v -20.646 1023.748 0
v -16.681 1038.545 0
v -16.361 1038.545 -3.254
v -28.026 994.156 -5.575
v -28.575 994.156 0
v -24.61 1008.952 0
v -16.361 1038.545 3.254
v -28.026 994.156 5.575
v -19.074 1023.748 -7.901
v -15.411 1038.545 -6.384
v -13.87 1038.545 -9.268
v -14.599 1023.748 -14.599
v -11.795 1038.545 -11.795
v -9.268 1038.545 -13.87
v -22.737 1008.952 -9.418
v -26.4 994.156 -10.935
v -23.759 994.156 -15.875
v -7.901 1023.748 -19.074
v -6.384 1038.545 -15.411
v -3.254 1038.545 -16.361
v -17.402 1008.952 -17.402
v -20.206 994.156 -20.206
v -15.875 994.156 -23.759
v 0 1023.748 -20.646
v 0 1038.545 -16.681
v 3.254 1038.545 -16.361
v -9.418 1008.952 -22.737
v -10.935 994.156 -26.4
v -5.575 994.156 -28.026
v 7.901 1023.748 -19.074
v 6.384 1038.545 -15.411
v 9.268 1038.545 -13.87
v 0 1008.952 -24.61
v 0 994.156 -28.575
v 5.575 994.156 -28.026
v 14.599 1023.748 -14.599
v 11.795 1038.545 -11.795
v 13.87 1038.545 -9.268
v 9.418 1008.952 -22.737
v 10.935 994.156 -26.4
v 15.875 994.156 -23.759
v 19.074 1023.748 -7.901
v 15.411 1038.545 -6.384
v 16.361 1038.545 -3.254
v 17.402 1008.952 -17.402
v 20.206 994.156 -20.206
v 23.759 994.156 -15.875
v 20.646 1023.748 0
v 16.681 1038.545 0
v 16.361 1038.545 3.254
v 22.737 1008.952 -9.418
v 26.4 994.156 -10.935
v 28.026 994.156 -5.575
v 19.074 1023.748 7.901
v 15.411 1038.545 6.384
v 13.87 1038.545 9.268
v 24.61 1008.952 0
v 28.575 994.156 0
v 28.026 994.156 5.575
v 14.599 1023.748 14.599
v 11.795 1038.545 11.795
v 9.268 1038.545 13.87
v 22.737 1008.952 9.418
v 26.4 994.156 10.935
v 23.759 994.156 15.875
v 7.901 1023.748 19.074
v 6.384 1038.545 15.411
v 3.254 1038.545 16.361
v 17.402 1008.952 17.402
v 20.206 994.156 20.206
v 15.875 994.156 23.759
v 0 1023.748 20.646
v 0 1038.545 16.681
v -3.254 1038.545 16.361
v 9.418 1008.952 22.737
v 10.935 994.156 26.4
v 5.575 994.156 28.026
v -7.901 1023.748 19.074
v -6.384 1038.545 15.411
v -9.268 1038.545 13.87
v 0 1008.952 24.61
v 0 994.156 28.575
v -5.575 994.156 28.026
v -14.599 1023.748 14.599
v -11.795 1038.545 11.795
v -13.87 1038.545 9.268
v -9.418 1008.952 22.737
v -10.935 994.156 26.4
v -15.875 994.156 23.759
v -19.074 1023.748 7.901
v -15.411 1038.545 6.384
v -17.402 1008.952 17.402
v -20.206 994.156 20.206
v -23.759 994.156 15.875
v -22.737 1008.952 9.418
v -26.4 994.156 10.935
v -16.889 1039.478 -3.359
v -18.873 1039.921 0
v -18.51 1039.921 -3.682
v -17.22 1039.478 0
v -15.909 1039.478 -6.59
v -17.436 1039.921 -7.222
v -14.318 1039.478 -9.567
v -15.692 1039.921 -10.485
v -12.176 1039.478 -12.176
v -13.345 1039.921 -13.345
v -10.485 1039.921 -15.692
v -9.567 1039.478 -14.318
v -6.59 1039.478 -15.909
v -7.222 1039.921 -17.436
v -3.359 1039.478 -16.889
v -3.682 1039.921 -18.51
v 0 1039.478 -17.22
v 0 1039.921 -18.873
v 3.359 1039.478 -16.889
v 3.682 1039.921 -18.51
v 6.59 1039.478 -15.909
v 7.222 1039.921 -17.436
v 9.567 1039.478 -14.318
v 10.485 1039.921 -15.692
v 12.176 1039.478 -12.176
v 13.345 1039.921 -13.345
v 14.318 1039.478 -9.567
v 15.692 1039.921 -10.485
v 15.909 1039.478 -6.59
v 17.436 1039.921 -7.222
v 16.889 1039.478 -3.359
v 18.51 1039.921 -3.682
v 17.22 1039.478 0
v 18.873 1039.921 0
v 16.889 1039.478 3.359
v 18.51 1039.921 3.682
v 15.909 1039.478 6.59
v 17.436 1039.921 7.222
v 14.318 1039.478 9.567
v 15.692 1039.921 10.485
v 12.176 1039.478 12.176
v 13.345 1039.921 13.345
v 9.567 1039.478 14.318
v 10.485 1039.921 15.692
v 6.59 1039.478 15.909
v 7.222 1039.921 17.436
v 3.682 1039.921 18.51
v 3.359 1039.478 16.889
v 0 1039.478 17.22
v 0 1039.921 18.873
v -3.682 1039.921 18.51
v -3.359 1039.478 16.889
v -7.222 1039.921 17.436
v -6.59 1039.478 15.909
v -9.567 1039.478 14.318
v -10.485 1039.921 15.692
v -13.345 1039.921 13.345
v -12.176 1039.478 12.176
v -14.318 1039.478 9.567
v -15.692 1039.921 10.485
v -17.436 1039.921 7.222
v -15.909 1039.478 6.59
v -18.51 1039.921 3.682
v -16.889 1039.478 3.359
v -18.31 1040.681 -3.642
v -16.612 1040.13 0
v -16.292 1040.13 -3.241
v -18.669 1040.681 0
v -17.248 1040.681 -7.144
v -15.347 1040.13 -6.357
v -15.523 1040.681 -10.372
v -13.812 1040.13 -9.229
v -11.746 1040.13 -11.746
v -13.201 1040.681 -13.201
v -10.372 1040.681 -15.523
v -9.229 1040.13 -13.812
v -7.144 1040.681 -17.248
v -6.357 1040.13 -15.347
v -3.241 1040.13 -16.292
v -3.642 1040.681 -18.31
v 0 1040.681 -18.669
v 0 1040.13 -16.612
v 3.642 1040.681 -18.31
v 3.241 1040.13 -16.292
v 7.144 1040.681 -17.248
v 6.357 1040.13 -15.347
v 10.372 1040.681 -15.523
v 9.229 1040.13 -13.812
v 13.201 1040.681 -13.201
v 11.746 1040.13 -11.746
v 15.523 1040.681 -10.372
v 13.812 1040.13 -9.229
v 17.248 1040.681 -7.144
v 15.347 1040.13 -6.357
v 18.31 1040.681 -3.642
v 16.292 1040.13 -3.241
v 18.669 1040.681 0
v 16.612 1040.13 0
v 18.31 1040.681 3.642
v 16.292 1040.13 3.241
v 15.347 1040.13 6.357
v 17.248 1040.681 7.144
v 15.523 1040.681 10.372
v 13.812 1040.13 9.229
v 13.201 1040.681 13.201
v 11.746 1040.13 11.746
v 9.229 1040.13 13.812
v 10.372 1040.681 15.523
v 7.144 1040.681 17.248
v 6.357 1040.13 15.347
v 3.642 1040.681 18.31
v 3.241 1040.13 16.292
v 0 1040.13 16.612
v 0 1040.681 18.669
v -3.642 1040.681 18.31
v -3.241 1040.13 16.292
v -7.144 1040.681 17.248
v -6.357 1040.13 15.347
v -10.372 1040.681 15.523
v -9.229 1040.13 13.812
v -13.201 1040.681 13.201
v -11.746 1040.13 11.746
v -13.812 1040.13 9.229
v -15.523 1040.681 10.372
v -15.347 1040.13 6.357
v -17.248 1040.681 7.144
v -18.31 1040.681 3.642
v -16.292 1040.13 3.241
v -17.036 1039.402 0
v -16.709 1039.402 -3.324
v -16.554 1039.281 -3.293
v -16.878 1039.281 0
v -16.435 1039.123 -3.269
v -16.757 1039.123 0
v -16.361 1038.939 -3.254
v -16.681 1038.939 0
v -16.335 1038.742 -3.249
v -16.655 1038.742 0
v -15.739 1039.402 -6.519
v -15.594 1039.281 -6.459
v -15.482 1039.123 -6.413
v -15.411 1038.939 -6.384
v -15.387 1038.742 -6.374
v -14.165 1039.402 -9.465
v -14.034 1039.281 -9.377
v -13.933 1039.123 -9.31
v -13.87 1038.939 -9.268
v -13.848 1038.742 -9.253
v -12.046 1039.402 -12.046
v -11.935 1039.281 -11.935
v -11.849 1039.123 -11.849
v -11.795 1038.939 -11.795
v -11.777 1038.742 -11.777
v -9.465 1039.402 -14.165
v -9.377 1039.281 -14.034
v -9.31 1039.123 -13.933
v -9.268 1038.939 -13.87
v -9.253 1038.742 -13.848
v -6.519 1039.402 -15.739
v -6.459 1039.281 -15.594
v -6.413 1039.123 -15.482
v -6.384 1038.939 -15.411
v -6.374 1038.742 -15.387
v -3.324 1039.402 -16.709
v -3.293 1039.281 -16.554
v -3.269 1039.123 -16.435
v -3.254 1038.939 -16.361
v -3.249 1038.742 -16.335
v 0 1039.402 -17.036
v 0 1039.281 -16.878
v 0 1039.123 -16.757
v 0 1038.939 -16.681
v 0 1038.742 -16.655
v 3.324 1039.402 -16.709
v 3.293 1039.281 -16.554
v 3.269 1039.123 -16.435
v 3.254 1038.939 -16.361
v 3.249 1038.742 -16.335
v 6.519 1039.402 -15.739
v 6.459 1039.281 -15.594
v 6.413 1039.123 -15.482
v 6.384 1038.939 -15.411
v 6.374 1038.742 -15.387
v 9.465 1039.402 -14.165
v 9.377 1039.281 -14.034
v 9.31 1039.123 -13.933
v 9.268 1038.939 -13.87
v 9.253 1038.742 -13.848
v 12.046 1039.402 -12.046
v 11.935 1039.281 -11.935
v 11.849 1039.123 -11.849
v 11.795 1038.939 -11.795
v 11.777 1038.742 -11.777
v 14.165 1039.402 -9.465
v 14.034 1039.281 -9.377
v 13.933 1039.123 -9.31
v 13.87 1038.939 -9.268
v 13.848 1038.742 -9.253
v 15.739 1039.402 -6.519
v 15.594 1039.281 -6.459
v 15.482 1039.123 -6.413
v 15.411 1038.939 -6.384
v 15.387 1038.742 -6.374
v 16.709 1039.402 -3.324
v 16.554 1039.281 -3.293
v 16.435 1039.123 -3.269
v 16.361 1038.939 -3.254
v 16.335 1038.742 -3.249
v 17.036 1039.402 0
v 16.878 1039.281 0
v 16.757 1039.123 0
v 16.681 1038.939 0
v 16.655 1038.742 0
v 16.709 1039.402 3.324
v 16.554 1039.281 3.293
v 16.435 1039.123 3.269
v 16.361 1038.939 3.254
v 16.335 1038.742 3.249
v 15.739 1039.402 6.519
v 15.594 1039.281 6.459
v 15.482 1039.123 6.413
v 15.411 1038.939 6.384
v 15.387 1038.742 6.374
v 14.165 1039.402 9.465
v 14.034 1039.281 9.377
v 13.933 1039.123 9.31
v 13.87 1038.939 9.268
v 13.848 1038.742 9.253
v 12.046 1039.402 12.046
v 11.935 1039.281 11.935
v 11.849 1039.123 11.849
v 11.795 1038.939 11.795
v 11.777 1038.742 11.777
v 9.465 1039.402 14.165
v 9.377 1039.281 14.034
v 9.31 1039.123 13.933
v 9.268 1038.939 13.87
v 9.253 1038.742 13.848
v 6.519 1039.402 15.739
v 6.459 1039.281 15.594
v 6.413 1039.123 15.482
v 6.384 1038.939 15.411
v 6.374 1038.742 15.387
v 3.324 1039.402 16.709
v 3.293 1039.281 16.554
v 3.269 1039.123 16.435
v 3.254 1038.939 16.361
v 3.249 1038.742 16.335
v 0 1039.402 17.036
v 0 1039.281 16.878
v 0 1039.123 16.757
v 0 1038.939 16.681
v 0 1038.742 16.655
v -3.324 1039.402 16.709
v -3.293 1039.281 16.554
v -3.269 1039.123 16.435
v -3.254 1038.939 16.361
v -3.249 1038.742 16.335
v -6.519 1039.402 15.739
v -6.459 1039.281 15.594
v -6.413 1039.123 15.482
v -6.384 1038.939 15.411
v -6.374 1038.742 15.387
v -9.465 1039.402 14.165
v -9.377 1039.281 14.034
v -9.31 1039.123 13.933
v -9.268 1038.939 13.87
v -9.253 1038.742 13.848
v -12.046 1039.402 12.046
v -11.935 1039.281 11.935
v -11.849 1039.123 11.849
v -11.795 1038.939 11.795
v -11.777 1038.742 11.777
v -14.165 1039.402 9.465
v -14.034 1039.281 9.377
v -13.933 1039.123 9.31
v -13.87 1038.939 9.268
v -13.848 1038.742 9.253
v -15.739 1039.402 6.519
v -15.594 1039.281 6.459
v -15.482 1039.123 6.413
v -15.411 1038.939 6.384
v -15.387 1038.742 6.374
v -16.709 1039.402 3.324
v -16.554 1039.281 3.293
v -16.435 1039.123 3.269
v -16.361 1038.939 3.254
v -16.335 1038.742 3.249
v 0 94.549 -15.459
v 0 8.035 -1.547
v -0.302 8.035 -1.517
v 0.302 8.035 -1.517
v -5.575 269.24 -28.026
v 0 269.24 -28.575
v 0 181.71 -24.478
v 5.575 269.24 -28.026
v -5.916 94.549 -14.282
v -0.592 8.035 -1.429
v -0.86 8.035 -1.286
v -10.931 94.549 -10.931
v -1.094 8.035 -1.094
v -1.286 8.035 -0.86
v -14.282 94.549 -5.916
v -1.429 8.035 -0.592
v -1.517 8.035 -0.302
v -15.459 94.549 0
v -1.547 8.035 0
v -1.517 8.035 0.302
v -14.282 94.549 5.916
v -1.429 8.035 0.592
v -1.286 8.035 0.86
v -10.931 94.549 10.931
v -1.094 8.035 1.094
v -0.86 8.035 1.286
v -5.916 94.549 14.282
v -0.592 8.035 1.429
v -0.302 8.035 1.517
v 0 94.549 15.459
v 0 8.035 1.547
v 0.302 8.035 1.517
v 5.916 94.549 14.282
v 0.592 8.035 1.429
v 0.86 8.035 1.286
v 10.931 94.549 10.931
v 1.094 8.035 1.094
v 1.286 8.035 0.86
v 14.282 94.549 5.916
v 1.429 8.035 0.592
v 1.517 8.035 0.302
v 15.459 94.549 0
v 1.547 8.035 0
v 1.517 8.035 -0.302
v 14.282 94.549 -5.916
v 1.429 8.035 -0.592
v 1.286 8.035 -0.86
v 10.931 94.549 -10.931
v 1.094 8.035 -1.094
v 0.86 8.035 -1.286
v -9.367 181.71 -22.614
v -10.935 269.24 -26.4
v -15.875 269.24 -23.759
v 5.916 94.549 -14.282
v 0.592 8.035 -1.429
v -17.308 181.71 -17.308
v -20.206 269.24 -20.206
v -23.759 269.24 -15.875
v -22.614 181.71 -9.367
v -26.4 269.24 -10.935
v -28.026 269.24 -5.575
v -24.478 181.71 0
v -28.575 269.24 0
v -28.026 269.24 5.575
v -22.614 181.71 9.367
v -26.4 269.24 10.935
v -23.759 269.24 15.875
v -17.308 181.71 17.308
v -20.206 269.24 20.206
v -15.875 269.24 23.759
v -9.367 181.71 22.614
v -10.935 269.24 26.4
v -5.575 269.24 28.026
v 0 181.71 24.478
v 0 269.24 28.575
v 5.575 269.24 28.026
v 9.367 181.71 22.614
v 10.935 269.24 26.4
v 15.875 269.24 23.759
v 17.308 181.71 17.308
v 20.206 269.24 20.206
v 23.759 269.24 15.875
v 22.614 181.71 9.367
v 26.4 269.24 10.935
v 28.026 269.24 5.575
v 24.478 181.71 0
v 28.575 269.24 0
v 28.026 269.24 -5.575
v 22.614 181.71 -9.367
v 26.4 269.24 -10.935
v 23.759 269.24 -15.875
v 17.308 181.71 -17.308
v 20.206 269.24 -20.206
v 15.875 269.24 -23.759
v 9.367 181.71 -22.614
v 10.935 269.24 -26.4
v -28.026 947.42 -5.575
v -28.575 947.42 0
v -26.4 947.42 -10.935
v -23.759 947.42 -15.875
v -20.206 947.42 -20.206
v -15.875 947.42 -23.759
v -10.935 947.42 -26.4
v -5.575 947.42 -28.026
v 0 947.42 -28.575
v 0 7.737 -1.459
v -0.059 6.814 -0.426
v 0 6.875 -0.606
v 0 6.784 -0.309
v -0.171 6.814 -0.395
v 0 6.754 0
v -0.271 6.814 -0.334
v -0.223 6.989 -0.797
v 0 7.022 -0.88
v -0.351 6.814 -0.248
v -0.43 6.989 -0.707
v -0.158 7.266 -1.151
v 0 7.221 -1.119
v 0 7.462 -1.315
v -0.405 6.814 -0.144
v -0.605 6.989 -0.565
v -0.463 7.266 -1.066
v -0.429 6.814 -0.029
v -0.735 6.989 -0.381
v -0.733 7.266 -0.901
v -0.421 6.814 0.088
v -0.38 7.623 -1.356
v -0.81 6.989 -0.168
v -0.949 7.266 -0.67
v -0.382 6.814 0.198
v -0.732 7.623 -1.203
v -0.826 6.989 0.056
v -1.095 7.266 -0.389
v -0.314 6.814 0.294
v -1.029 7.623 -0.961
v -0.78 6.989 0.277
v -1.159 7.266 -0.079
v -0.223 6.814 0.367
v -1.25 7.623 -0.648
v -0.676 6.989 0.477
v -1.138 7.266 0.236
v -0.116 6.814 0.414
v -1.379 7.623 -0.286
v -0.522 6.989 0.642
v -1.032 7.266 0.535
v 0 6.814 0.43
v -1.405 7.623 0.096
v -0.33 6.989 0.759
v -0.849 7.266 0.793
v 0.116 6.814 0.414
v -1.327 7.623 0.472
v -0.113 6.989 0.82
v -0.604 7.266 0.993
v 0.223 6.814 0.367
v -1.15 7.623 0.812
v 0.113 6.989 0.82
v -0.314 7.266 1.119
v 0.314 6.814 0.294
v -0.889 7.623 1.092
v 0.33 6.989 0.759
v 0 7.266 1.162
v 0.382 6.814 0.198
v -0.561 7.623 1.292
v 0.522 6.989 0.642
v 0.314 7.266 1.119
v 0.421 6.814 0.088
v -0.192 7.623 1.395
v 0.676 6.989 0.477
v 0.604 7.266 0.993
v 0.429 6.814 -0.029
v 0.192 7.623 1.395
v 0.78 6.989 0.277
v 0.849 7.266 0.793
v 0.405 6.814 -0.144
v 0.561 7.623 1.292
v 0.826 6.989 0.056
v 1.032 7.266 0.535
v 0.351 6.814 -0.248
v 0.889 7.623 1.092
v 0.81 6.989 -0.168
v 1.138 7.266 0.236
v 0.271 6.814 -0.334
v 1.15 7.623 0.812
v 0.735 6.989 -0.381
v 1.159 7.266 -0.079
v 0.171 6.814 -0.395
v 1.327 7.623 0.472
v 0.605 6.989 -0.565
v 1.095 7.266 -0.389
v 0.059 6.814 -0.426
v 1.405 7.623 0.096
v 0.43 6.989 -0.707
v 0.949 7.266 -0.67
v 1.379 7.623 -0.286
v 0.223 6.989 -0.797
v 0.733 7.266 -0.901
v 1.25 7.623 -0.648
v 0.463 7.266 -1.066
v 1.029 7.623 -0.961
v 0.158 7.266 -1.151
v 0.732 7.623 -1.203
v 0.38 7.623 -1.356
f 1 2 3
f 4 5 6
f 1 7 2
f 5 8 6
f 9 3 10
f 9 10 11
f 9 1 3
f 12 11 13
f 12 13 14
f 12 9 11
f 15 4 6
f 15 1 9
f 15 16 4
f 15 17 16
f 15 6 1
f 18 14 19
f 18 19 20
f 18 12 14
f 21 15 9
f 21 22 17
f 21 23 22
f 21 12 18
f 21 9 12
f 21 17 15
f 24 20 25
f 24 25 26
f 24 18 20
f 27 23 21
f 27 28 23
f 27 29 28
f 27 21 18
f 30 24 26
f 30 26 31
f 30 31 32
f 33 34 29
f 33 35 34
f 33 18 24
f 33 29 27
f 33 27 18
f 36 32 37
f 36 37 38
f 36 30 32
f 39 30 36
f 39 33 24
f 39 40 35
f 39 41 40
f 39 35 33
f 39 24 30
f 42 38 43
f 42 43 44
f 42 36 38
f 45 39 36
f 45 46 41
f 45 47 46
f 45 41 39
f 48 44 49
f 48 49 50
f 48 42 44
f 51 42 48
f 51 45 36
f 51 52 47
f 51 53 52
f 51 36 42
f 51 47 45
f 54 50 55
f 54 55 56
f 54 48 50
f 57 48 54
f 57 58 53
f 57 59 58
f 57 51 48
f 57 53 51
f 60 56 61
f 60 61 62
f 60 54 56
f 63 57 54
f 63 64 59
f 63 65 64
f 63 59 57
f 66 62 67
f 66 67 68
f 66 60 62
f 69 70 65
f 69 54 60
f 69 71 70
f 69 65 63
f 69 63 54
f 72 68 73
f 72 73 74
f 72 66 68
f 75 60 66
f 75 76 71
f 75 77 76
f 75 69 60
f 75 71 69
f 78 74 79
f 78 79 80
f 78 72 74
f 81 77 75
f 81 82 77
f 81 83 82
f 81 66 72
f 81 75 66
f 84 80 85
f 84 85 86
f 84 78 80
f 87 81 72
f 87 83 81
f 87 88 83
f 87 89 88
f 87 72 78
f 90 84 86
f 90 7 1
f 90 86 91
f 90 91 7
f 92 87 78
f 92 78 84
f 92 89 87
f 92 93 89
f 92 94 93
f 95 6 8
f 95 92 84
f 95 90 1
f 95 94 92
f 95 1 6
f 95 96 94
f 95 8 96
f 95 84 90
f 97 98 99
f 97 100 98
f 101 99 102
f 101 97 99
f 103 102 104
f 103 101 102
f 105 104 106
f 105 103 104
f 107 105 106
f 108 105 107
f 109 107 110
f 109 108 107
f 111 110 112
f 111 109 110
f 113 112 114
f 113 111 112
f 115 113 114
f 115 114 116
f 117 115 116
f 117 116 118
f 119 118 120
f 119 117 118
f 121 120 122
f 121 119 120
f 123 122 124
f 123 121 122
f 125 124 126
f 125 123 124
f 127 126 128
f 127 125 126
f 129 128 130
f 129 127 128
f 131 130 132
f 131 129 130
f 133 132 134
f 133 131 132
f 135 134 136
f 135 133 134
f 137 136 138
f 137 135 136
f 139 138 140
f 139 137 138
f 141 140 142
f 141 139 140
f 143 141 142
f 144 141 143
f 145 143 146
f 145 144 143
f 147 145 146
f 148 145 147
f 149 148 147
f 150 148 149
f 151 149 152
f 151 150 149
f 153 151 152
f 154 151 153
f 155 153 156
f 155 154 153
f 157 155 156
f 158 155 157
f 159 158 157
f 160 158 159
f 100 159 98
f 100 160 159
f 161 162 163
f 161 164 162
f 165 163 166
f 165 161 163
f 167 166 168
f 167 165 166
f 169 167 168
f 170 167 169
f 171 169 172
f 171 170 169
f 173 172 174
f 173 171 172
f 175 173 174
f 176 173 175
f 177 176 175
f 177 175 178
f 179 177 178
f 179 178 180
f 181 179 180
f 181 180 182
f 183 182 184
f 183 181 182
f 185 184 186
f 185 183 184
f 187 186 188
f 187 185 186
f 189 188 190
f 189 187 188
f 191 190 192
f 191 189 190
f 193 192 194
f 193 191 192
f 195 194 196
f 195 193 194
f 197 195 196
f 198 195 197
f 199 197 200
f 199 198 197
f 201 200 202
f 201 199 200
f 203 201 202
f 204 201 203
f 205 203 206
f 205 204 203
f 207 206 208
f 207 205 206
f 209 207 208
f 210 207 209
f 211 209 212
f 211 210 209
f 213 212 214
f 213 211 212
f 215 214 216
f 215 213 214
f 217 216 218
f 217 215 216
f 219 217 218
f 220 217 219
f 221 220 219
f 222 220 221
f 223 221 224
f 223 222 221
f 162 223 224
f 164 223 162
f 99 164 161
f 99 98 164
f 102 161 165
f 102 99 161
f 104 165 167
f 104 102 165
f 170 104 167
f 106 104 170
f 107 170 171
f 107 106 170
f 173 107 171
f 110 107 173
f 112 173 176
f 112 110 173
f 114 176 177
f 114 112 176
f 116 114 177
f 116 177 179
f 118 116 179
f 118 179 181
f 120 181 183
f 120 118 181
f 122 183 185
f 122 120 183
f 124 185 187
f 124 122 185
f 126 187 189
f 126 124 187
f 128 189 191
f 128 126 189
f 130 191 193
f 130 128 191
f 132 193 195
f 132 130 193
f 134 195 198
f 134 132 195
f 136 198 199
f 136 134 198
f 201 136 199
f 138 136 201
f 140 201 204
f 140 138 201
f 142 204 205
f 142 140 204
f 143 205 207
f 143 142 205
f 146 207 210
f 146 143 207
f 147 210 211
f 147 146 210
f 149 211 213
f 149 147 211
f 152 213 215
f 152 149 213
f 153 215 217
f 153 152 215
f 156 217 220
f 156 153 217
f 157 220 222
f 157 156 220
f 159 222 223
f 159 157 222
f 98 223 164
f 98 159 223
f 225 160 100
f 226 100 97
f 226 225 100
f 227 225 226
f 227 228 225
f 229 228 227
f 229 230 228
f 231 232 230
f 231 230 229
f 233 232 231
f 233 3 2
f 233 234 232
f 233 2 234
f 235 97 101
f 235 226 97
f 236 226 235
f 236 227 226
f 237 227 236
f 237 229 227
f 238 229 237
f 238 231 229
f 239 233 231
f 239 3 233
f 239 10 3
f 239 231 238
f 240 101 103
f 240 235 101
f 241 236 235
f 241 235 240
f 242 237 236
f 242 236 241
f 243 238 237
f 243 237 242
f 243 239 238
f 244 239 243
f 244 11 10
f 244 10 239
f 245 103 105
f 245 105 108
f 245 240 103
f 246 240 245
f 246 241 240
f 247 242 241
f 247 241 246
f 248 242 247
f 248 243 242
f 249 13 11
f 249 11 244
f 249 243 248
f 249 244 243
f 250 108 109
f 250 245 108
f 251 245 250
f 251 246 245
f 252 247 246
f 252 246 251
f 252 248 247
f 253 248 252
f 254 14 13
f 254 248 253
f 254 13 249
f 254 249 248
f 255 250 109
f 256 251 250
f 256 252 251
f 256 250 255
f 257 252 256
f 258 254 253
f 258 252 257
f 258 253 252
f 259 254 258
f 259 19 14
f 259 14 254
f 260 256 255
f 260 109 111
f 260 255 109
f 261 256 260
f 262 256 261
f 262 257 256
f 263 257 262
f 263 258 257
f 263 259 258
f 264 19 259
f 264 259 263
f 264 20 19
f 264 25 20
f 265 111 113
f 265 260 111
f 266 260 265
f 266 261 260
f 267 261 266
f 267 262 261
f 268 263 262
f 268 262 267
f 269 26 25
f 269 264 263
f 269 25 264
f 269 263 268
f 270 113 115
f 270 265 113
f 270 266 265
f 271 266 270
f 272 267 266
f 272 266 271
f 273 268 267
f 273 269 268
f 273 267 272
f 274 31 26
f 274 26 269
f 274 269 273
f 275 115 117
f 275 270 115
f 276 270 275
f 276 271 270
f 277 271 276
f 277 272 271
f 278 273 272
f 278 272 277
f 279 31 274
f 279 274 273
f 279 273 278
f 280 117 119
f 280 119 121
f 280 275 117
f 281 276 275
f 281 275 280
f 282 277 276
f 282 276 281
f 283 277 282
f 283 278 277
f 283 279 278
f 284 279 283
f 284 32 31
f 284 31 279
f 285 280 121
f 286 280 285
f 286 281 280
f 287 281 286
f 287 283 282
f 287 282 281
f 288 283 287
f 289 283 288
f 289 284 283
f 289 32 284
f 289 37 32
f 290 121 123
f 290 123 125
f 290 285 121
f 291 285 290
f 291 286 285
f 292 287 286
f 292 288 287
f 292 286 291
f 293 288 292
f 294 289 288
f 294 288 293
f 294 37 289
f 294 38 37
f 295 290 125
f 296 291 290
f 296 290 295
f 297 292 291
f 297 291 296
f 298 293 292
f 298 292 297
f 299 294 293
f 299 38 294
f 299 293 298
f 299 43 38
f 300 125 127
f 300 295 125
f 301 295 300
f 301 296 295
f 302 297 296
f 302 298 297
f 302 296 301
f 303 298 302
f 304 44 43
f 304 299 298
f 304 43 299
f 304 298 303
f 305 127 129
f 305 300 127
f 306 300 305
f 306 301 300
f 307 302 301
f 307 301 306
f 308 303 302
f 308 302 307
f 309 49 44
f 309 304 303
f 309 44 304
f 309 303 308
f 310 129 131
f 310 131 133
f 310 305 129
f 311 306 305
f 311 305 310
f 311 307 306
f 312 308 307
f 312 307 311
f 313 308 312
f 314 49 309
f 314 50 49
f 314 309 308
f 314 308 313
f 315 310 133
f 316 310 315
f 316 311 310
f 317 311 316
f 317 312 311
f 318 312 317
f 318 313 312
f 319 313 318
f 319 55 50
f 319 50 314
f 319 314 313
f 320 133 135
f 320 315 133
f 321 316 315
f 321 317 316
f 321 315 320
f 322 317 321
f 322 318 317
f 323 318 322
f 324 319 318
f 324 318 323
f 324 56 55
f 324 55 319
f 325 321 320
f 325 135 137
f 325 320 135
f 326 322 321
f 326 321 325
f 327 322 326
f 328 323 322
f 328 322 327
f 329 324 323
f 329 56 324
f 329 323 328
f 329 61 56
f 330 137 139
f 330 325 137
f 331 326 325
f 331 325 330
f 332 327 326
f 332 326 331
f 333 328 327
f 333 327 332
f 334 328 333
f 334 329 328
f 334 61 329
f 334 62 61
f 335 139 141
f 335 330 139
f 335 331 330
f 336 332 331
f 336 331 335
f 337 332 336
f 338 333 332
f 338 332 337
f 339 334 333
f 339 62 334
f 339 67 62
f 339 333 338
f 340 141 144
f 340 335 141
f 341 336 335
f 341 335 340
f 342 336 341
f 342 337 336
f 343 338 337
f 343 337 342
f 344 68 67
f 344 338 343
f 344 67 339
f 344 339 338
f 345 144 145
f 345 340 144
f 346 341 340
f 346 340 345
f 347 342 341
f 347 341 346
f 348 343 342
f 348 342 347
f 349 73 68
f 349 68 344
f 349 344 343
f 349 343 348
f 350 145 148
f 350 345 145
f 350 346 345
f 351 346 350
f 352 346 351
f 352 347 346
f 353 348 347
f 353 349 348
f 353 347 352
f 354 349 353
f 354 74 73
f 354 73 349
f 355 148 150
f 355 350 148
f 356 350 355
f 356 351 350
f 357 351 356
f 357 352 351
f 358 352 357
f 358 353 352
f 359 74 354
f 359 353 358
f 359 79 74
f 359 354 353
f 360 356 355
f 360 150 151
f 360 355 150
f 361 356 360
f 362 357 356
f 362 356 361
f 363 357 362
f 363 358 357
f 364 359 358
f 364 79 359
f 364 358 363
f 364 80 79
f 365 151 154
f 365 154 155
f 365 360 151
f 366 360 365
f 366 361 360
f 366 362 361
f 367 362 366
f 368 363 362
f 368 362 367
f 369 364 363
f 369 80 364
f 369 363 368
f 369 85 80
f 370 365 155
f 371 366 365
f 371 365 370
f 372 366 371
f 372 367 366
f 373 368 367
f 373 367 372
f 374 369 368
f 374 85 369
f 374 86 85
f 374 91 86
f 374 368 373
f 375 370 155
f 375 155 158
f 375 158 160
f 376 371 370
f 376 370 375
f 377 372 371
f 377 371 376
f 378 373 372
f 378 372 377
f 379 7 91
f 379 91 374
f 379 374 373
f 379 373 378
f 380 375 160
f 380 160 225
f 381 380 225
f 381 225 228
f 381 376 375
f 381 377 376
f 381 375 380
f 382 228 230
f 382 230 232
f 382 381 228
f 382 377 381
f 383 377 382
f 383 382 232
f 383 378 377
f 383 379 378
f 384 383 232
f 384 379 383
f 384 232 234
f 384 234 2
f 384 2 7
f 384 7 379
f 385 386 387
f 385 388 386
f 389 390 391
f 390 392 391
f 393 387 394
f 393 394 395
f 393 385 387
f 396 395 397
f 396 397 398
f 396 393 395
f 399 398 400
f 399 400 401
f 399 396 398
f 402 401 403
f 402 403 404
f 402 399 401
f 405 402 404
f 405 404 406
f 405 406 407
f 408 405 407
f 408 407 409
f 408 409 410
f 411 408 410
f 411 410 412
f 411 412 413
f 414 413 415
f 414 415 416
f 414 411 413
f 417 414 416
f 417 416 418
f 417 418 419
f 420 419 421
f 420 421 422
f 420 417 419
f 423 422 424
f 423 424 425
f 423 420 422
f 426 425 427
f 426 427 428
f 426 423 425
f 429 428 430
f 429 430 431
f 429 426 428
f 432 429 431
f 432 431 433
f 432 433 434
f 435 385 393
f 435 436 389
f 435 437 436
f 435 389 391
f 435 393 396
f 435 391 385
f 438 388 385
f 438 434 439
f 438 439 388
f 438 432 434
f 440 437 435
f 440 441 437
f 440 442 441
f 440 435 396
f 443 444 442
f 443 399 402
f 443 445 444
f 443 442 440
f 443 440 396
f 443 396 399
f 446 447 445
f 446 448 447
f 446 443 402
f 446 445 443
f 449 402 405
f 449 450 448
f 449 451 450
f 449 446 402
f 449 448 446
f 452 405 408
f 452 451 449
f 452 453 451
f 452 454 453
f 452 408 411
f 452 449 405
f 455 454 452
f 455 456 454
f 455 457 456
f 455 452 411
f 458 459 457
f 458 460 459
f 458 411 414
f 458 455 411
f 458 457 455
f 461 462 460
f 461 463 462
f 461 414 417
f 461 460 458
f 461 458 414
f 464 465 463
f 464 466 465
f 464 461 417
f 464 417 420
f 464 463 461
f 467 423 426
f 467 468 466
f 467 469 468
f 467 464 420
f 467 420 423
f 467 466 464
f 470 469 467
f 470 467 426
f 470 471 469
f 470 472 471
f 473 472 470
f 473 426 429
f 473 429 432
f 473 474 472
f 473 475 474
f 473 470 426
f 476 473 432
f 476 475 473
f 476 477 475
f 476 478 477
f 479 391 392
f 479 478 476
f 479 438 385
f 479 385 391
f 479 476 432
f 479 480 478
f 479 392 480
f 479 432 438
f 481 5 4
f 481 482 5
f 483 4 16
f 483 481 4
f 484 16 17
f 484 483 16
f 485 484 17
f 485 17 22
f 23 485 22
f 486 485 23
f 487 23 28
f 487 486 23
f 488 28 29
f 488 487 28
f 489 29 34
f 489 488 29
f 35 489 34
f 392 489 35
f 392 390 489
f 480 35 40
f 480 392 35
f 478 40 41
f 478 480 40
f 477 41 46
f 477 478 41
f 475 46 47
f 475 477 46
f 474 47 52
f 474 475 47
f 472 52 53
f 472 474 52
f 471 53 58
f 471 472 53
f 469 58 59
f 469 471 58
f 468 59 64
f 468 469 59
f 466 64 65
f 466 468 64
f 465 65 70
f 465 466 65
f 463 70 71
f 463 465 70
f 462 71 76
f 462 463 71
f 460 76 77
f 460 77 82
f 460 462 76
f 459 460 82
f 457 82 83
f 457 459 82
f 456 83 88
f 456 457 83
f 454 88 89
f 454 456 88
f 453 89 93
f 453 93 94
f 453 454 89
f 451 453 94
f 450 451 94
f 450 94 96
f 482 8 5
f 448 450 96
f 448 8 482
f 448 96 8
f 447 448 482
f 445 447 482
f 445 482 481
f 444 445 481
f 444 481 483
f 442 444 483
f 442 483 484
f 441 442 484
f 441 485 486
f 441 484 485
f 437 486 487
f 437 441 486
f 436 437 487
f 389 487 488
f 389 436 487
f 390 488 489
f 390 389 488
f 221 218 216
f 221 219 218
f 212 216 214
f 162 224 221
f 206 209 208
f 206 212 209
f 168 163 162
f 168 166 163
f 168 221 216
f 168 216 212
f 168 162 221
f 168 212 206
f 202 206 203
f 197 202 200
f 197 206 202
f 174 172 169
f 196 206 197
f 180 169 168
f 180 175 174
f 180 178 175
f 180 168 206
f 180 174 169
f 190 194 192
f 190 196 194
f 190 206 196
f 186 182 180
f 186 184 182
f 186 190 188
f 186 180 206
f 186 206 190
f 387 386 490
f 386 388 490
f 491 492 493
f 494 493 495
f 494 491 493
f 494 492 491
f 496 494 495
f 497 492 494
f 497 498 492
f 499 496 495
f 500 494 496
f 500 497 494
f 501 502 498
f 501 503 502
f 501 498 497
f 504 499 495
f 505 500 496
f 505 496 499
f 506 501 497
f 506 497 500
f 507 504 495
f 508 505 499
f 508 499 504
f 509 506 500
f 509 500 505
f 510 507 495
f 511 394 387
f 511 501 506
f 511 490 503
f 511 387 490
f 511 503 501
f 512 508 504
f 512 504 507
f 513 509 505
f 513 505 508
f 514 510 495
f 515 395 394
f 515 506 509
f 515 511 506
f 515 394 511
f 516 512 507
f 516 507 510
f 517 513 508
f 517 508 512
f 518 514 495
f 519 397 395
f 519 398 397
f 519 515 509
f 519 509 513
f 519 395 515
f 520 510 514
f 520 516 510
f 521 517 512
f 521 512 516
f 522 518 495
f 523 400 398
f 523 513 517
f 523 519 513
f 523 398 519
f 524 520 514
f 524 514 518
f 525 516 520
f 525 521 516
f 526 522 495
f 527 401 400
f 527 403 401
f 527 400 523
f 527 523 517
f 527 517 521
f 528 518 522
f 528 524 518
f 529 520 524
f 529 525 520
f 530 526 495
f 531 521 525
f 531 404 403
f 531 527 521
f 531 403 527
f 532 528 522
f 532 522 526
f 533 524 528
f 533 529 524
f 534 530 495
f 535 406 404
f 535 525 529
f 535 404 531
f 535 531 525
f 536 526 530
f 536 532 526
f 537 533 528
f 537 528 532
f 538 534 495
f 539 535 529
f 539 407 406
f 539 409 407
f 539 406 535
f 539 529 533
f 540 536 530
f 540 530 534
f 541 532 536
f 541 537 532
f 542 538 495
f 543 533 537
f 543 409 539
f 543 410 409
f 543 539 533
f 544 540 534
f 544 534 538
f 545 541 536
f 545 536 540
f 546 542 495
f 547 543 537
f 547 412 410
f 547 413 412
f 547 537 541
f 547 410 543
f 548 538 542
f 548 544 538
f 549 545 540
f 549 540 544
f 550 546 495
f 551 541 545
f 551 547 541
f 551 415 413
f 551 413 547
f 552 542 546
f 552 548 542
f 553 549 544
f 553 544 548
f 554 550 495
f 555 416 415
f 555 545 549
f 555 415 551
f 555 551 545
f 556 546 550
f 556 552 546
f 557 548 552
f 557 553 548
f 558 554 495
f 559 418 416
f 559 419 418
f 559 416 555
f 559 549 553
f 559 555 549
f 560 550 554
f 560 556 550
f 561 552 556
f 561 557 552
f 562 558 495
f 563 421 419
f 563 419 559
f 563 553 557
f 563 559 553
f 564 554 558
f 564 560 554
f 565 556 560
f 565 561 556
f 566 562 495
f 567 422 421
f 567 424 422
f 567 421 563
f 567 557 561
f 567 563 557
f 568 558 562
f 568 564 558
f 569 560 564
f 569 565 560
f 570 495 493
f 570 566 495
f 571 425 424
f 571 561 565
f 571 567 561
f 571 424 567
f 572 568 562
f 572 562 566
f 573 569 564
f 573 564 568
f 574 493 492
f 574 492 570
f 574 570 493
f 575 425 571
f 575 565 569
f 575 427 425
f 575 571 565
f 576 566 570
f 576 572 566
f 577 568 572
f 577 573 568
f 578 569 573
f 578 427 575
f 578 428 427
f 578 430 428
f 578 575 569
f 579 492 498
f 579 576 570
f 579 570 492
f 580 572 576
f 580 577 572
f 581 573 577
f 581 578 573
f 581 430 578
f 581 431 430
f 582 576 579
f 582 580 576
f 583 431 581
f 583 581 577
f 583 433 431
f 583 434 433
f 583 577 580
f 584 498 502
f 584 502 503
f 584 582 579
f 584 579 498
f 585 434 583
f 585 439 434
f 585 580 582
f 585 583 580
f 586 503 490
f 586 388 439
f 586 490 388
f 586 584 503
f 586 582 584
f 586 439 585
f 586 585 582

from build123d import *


with BuildPart() as part:
    # Sketch2 → Revolve1 (revolve)
    with BuildSketch(Plane.XY):
        with BuildLine():
            Line((0, 947.42), (0, 6.753760064))
            ThreePointArc((0, 6.753760064), (1.004358981, 7.115605787), (1.547169826, 8.034858568))
            ThreePointArc((1.547169826, 8.034858568), (20.581846727, 138.066176315), (28.575, 269.24))
            Line((28.575, 269.24), (28.575, 947.42))
            Line((28.575, 947.42), (0, 947.42))
        make_face()
    revolve(axis=Axis((0, 0, 0), (0, 1, 0)))

    # Sketch3 → Revolve2 (revolve)
    with BuildSketch(Plane.XY):
        with BuildLine():
            Line((-28.575, 994.156), (-28.575, 947.42))
            Line((-28.575, 947.42), (0, 947.42))
            Line((0, 947.42), (0, 1040.13))
            Line((0, 1040.13), (-16.6116, 1040.13))
            Line((-16.6116, 1040.13), (-18.669, 1040.681278669))
            Line((-18.669, 1040.681278669), (-18.872794116, 1039.920708673))
            Line((-18.872794116, 1039.920708673), (-17.219933754, 1039.477826074))
            ThreePointArc((-17.219933754, 1039.477826074), (-16.757242508, 1039.122790594), (-16.681118386, 1038.544570482))
            Line((-16.681118386, 1038.544570482), (-28.575, 994.156))
        make_face()
    revolve(axis=Axis((0, 1040.13, 0), (0, -1, 0)))


solid = part.part
